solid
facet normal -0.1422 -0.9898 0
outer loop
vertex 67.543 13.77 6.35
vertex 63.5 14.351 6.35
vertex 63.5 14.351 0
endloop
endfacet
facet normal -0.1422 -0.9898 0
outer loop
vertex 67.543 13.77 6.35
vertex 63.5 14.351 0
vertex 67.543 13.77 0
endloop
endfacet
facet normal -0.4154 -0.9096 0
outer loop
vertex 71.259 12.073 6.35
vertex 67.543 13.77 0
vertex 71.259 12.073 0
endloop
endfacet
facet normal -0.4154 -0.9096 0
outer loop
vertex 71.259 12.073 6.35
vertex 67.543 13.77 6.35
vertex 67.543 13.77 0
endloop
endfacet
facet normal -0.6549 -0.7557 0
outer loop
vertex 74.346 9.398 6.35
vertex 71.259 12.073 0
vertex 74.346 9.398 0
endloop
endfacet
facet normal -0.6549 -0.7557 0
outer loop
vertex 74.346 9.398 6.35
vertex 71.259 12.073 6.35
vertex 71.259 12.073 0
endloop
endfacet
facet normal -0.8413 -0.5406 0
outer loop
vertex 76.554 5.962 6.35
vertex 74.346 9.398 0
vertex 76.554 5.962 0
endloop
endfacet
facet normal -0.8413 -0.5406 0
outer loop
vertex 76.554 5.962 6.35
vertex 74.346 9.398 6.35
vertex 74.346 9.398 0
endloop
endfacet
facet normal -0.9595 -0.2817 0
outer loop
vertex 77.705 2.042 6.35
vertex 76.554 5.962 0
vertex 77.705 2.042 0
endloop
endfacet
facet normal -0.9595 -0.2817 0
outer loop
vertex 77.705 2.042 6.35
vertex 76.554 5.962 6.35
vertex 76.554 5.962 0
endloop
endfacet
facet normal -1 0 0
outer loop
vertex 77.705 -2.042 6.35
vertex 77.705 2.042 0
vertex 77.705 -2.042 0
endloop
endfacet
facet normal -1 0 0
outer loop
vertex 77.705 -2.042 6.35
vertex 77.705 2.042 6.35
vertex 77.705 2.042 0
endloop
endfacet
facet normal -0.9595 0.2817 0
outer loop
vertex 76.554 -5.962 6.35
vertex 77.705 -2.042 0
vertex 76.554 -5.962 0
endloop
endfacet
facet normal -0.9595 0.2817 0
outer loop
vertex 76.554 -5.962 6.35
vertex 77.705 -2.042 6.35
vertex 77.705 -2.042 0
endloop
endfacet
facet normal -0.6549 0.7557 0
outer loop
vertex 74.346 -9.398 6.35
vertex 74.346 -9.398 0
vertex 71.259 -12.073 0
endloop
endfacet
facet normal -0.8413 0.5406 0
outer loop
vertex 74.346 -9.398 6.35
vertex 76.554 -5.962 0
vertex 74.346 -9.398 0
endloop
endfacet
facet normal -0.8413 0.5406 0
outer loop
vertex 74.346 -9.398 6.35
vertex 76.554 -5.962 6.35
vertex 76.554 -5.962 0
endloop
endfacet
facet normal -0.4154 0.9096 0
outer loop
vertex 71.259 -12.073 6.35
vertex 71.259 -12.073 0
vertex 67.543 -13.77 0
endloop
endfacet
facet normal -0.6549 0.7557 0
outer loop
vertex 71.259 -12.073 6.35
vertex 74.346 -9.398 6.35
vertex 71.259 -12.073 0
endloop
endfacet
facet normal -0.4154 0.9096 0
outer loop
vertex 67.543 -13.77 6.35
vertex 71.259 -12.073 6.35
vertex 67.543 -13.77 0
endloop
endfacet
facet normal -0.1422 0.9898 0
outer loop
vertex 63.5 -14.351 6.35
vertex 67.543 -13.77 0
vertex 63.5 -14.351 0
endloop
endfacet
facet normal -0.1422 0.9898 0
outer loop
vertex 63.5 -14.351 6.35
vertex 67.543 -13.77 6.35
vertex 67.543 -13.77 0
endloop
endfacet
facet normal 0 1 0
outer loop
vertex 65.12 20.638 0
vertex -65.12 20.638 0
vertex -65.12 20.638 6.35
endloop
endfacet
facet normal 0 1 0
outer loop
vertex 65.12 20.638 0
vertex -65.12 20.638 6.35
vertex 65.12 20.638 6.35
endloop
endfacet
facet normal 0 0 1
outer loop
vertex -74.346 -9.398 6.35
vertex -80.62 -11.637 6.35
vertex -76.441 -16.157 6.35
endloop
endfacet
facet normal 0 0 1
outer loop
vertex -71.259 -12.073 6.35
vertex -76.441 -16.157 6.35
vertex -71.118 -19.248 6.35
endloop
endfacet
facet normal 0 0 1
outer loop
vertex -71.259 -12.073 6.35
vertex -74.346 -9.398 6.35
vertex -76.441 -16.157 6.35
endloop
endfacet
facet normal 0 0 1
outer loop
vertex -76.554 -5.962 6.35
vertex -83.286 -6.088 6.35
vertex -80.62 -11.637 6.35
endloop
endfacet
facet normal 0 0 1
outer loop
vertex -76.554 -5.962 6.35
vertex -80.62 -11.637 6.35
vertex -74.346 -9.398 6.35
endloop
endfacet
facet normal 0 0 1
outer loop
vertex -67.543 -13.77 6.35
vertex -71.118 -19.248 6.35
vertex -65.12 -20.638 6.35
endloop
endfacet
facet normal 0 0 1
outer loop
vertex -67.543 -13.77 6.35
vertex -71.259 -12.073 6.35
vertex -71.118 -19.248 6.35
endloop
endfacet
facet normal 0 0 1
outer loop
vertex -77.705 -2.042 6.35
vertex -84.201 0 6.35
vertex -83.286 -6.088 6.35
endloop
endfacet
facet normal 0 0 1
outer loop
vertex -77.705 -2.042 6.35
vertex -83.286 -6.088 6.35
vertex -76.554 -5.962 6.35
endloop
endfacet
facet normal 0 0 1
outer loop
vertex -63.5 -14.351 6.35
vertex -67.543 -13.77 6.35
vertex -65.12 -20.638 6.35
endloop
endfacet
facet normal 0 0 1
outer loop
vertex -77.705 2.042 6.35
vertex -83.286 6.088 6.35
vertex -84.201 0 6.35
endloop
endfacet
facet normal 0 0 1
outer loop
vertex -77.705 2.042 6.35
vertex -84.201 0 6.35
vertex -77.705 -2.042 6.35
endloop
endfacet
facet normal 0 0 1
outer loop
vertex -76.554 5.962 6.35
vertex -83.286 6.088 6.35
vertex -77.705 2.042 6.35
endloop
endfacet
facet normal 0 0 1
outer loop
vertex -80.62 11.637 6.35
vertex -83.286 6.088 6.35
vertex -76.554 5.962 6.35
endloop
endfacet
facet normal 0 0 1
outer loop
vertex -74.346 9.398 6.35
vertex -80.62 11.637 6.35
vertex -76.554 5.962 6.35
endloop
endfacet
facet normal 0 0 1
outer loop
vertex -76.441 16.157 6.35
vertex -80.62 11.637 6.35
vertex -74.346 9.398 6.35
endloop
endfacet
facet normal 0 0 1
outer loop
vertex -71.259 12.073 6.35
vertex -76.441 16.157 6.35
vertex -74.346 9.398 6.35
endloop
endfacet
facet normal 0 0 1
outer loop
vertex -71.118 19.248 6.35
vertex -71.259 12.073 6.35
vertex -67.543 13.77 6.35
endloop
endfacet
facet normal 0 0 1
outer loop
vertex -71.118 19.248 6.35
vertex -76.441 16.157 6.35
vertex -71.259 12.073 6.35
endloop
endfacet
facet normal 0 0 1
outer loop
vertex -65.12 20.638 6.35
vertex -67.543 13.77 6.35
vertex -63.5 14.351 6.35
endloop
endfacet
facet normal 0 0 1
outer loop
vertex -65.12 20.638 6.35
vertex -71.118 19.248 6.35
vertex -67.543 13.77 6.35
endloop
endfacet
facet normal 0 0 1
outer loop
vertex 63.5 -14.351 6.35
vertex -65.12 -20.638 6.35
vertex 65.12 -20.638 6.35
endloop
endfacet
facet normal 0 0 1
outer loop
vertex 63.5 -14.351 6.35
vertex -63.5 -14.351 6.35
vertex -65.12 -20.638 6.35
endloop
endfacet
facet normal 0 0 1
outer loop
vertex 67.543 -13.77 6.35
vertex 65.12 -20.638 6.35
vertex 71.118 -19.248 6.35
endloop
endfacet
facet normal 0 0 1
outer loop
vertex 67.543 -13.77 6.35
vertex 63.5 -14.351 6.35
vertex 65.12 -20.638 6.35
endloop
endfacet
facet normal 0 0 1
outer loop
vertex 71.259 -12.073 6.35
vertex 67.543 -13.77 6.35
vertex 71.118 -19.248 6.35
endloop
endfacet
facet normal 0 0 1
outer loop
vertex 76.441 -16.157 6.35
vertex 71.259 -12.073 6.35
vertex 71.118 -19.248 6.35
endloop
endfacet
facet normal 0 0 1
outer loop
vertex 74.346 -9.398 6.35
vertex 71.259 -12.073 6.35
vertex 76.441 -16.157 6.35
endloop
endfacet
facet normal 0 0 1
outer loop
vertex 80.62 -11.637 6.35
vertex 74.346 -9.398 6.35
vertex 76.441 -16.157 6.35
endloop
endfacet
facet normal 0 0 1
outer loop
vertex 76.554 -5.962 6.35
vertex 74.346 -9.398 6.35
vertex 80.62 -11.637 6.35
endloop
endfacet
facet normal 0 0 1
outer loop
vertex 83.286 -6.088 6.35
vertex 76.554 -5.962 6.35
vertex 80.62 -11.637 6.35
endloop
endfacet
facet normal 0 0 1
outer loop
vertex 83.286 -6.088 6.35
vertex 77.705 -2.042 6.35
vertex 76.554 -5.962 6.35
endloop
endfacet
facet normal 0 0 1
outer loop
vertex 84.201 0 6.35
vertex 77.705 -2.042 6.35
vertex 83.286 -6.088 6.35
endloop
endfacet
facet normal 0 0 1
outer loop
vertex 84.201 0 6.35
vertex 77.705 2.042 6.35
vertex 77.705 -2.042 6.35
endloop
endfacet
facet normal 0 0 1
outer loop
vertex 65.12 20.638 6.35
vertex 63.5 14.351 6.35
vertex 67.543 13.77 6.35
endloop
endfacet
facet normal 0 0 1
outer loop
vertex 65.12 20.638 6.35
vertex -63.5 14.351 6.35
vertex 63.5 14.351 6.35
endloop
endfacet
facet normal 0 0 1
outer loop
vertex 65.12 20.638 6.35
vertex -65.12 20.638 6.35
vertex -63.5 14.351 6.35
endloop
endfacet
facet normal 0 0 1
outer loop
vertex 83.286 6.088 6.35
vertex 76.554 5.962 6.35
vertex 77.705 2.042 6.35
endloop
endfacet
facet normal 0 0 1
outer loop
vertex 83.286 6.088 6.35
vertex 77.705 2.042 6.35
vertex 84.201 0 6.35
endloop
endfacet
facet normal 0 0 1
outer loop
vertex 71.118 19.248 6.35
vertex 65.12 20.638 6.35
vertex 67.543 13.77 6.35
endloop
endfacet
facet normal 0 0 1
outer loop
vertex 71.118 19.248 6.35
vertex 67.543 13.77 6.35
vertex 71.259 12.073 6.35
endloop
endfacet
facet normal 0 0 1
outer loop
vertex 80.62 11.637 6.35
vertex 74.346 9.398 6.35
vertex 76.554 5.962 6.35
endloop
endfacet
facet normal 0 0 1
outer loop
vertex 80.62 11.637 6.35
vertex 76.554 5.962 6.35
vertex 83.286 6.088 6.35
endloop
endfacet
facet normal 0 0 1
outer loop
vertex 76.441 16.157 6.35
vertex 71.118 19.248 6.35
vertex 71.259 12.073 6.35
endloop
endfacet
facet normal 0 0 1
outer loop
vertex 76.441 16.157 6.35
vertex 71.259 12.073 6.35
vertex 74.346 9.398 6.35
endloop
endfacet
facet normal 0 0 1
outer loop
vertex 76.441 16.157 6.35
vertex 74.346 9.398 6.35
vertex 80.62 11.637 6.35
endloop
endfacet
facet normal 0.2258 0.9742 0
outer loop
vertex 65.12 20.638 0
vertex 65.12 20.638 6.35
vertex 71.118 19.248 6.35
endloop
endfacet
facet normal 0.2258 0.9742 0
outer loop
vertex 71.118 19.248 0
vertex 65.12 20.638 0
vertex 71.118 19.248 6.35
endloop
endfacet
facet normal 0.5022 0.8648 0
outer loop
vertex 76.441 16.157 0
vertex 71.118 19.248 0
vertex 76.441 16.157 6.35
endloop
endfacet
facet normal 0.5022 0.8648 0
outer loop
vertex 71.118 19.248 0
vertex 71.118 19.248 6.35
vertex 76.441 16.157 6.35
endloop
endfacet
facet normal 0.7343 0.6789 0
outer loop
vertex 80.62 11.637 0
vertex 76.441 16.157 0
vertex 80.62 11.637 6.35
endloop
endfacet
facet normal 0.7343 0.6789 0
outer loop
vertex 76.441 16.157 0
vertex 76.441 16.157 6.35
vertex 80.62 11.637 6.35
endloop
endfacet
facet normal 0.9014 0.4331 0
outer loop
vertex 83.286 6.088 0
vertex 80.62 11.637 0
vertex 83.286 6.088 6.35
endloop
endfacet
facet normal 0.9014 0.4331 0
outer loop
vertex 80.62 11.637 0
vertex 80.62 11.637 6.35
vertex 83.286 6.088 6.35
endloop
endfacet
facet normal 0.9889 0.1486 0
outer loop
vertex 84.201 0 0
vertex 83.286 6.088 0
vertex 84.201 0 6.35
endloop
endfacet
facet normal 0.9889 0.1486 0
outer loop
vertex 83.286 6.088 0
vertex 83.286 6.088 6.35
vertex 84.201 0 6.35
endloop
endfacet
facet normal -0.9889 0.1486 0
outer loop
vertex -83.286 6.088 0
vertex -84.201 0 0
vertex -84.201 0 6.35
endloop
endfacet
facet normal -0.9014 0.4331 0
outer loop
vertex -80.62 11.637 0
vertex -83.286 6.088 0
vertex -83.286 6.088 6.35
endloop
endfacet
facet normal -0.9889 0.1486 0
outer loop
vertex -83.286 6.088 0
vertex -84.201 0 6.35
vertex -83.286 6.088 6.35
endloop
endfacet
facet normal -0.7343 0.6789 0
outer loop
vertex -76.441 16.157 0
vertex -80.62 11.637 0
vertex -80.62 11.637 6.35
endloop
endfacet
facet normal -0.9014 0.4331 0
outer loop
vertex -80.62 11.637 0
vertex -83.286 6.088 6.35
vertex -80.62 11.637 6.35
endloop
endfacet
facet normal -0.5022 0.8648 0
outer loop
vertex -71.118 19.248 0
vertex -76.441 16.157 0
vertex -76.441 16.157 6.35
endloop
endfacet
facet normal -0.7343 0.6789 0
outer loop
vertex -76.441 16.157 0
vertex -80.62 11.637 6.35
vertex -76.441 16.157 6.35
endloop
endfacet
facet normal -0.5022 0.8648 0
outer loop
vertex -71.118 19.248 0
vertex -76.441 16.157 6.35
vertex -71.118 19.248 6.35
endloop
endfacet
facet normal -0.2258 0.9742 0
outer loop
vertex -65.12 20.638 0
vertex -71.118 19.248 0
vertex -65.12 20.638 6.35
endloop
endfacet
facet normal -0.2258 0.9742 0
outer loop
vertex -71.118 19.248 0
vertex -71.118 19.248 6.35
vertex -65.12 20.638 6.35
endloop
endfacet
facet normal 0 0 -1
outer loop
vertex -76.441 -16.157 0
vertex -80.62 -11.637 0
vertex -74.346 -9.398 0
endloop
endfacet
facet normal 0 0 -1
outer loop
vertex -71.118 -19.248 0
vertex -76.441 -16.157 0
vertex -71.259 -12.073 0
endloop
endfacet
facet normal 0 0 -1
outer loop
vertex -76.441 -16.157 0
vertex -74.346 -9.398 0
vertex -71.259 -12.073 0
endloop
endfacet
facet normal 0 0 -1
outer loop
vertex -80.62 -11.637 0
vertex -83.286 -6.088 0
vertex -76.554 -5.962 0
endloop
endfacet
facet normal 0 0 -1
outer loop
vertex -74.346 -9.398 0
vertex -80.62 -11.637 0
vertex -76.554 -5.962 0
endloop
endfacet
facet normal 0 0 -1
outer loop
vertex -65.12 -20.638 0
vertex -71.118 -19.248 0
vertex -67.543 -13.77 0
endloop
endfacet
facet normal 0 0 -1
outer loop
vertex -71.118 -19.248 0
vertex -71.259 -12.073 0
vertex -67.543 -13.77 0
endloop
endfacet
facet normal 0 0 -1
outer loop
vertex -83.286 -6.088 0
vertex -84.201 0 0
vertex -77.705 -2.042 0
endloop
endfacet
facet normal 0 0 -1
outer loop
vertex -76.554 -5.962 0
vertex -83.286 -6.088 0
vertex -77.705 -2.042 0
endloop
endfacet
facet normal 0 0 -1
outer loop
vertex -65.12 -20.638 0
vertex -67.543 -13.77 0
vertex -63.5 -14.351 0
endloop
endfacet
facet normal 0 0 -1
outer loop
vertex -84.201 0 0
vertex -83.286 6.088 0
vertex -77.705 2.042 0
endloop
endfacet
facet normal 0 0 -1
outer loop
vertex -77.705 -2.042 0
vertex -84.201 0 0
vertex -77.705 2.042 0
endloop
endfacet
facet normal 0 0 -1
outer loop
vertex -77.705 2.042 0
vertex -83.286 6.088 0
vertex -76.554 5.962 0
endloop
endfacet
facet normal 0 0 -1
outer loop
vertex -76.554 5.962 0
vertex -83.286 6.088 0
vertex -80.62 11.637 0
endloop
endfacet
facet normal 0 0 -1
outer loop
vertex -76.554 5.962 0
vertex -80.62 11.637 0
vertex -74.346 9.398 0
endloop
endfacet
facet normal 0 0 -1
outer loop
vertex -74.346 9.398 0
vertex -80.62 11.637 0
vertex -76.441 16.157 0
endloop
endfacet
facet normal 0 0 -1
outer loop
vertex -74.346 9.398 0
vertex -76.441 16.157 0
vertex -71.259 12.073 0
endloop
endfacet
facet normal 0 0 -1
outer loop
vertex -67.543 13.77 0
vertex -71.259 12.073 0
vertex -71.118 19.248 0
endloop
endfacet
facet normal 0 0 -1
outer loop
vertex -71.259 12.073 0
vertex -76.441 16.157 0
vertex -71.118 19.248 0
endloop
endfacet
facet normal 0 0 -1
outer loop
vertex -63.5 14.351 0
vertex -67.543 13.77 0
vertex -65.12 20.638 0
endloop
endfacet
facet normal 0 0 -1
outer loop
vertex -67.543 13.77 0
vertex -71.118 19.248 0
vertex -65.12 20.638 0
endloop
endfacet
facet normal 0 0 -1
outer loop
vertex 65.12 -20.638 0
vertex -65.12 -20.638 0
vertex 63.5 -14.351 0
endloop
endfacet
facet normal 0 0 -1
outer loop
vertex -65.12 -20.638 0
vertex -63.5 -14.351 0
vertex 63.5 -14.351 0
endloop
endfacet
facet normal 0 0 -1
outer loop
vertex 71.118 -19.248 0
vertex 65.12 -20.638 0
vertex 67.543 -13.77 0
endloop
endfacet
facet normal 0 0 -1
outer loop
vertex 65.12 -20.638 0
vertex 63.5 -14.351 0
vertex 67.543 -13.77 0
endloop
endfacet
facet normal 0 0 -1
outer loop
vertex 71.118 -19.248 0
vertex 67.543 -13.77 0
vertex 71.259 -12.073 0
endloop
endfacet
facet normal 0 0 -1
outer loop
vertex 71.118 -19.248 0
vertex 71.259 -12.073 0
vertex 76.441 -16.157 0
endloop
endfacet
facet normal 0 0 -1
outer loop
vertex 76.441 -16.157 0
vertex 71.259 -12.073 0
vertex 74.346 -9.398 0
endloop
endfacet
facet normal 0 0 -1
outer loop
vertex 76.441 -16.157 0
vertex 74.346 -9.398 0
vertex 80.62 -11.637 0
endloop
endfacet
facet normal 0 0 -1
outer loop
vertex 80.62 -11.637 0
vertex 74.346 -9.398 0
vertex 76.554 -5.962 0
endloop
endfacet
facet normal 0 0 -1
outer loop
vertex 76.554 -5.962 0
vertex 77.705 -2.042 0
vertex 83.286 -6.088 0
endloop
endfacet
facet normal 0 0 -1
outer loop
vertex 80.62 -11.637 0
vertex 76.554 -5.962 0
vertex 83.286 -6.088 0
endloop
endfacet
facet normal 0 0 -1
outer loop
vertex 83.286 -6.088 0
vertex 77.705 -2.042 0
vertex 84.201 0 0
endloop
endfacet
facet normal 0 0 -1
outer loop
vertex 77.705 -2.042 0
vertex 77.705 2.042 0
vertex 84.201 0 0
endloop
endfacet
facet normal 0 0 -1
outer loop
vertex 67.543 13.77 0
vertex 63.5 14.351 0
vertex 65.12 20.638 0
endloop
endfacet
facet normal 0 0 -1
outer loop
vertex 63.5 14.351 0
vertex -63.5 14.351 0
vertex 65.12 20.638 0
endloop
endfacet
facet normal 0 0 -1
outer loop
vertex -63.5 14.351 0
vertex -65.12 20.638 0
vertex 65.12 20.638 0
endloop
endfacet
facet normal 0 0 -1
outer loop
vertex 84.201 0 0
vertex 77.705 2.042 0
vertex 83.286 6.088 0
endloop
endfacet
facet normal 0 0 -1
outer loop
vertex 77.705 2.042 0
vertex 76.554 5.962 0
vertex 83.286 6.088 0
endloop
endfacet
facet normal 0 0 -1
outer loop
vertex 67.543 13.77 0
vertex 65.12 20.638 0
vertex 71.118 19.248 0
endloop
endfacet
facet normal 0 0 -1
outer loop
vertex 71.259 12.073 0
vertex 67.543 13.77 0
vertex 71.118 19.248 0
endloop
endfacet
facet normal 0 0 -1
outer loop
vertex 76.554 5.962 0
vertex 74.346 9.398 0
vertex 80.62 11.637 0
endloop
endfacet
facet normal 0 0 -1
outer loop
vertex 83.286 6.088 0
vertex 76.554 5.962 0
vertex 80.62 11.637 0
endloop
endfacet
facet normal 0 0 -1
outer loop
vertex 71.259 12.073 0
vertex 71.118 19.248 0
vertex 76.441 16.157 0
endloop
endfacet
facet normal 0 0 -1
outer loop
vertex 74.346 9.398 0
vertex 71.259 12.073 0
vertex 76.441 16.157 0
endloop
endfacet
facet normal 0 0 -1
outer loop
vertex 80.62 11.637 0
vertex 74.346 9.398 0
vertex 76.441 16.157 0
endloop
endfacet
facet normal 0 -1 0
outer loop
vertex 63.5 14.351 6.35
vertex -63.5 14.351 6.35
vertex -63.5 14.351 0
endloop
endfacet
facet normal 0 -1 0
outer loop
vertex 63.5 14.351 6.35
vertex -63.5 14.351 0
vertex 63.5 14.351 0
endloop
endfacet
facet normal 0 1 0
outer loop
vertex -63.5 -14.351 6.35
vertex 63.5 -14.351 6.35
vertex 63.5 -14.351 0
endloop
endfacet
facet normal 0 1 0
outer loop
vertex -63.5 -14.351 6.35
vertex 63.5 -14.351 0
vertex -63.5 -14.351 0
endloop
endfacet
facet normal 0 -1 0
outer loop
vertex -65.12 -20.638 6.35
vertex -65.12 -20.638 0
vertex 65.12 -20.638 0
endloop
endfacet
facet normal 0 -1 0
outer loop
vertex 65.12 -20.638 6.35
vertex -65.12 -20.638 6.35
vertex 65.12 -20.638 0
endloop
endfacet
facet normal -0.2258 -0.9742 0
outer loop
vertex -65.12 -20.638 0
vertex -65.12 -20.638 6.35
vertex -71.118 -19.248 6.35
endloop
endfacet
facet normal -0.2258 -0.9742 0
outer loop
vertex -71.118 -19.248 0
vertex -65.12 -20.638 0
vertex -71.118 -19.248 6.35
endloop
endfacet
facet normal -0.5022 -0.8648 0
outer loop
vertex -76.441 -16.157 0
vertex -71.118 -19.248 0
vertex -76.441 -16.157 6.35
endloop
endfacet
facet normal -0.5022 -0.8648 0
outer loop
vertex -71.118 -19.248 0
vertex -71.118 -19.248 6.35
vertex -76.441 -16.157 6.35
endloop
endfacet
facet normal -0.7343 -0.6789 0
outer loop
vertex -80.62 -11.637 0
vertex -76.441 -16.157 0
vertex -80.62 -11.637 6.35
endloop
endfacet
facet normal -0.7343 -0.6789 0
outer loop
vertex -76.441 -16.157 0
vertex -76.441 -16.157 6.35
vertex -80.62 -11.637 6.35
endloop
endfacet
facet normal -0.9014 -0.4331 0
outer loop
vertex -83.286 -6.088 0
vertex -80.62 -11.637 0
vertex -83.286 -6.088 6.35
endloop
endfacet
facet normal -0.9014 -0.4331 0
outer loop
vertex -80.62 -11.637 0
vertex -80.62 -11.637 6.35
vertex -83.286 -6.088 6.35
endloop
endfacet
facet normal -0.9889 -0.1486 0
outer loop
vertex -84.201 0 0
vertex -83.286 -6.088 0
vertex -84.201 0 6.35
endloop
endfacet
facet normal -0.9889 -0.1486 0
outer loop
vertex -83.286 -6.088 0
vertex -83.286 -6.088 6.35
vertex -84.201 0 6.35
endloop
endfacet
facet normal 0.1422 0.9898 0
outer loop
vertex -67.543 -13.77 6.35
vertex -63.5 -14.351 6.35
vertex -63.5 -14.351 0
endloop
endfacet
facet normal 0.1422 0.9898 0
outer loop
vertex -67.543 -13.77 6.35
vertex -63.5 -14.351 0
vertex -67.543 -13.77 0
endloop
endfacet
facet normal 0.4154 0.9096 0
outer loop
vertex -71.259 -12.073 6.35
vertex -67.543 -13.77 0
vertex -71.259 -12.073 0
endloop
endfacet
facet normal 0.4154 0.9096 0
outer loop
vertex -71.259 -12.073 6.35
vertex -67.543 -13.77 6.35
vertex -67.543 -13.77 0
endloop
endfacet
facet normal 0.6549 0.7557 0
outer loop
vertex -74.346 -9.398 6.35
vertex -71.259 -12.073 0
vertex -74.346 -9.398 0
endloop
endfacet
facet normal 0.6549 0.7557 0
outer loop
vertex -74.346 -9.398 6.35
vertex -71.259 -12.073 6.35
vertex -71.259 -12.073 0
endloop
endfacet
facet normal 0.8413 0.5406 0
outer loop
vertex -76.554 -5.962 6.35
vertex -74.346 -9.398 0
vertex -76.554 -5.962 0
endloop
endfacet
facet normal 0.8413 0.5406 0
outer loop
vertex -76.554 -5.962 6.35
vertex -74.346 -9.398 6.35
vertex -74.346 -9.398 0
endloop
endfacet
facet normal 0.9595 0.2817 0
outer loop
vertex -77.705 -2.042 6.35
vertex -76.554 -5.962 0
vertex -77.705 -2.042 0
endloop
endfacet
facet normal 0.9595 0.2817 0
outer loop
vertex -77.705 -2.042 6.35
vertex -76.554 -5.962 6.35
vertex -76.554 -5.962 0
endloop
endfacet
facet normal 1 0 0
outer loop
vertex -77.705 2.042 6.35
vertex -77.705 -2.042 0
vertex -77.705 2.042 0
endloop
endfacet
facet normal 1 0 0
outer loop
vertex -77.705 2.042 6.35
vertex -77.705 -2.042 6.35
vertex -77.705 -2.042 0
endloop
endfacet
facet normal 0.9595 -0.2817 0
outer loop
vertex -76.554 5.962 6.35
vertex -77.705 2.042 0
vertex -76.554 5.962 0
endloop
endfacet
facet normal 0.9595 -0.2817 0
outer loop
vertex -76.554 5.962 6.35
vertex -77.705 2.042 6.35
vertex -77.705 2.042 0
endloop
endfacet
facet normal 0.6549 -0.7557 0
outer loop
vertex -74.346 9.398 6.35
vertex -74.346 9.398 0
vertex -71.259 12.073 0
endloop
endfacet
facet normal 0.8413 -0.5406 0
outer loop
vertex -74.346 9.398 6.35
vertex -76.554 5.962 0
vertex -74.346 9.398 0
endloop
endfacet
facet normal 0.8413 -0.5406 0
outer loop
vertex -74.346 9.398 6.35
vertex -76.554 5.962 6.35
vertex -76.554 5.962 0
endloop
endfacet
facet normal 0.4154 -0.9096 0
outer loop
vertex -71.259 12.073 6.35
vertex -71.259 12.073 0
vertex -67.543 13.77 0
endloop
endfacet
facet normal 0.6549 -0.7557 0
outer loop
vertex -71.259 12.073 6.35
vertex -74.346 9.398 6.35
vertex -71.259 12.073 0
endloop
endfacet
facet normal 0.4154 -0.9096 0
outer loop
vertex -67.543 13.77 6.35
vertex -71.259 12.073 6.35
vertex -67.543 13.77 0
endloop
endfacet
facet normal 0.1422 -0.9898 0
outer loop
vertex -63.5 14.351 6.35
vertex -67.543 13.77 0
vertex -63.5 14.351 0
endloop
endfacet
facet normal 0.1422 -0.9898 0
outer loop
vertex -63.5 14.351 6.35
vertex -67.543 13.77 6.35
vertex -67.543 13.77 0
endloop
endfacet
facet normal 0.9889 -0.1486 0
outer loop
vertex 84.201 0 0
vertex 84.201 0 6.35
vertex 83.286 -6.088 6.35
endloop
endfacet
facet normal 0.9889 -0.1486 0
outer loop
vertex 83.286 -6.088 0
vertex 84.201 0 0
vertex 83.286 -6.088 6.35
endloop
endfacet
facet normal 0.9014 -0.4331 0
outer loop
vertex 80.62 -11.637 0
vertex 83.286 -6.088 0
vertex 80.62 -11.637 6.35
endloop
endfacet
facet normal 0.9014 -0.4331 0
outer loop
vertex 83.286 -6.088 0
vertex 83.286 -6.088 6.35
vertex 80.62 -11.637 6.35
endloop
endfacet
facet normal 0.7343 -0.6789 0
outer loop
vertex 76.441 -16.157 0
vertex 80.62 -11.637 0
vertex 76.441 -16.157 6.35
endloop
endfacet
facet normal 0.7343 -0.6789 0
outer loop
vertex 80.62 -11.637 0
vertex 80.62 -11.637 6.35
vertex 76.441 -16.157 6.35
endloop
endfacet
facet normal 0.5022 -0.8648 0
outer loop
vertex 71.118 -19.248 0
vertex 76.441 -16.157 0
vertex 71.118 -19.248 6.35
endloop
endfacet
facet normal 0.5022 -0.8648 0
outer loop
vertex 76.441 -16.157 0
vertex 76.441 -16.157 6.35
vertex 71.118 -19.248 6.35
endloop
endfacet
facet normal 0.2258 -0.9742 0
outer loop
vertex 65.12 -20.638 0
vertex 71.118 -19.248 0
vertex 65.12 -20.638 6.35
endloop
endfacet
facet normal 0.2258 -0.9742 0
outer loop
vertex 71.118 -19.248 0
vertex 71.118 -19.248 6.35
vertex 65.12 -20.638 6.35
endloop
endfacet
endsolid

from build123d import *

# Parameters (mm, degrees)
SKETCH1_W           = 168.402
SKETCH1_H           = 41.275
BOSS_EXTRUDE1_DEPTH = 6.35
CUT_EXTRUDE1_DEPTH  = 87.925469842
CUT_EXTRUDE2_DEPTH  = 87.925469842


with BuildPart() as part:
    # Sketch1 → Boss-Extrude1 (new body)
    with BuildSketch(Plane.XY):
        Rectangle(SKETCH1_W, SKETCH1_H)
    extrude(amount=BOSS_EXTRUDE1_DEPTH)

    # Sketch2 → Cut-Extrude1 (cut, through all)
    with BuildSketch(Plane.XY.offset(6.35)):
        with BuildLine():
            Line((63.5, -14.351), (-63.5, -14.351))
            ThreePointArc((-63.5, -14.351), (-77.851, 0), (-63.5, 14.351))
            Line((-63.5, 14.351), (63.5, 14.351))
            ThreePointArc((63.5, 14.351), (77.851, 0), (63.5, -14.351))
        make_face()
    extrude(amount=-CUT_EXTRUDE1_DEPTH, mode=Mode.SUBTRACT)

    # Sketch5 → Cut-Extrude2 (cut, through all)
    with BuildSketch(Plane.XY.offset(6.35)):
        with BuildLine():
            ThreePointArc((-84.201, -7.7e-08), (-78.699849051, 14.053326646), (-65.120183554, 20.6375))
            Line((-65.120183554, 20.6375), (-84.201, 20.6375))
            Line((-84.201, 20.6375), (-84.201, -7.7e-08))
        make_face()
        with BuildLine():
            ThreePointArc((-65.120183554, -20.6375), (-78.699848999, -14.053326703), (-84.201, -7.7e-08))
            Line((-84.201, -7.7e-08), (-84.201, -20.6375))
            Line((-84.201, -20.6375), (-65.120183554, -20.6375))
        make_face()
        with BuildLine():
            Line((84.201, 20.6375), (65.120183554, 20.6375))
            ThreePointArc((65.120183554, 20.6375), (78.699849025, 14.053326674), (84.201, 0))
            Line((84.201, 0), (84.201, 20.6375))
        make_face()
        with BuildLine():
            Line((84.201, -20.6375), (84.201, 0))
            ThreePointArc((84.201, 0), (78.699849025, -14.053326674), (65.120183554, -20.6375))
            Line((65.120183554, -20.6375), (84.201, -20.6375))
        make_face()
    extrude(amount=-CUT_EXTRUDE2_DEPTH, mode=Mode.SUBTRACT)


solid = part.part
